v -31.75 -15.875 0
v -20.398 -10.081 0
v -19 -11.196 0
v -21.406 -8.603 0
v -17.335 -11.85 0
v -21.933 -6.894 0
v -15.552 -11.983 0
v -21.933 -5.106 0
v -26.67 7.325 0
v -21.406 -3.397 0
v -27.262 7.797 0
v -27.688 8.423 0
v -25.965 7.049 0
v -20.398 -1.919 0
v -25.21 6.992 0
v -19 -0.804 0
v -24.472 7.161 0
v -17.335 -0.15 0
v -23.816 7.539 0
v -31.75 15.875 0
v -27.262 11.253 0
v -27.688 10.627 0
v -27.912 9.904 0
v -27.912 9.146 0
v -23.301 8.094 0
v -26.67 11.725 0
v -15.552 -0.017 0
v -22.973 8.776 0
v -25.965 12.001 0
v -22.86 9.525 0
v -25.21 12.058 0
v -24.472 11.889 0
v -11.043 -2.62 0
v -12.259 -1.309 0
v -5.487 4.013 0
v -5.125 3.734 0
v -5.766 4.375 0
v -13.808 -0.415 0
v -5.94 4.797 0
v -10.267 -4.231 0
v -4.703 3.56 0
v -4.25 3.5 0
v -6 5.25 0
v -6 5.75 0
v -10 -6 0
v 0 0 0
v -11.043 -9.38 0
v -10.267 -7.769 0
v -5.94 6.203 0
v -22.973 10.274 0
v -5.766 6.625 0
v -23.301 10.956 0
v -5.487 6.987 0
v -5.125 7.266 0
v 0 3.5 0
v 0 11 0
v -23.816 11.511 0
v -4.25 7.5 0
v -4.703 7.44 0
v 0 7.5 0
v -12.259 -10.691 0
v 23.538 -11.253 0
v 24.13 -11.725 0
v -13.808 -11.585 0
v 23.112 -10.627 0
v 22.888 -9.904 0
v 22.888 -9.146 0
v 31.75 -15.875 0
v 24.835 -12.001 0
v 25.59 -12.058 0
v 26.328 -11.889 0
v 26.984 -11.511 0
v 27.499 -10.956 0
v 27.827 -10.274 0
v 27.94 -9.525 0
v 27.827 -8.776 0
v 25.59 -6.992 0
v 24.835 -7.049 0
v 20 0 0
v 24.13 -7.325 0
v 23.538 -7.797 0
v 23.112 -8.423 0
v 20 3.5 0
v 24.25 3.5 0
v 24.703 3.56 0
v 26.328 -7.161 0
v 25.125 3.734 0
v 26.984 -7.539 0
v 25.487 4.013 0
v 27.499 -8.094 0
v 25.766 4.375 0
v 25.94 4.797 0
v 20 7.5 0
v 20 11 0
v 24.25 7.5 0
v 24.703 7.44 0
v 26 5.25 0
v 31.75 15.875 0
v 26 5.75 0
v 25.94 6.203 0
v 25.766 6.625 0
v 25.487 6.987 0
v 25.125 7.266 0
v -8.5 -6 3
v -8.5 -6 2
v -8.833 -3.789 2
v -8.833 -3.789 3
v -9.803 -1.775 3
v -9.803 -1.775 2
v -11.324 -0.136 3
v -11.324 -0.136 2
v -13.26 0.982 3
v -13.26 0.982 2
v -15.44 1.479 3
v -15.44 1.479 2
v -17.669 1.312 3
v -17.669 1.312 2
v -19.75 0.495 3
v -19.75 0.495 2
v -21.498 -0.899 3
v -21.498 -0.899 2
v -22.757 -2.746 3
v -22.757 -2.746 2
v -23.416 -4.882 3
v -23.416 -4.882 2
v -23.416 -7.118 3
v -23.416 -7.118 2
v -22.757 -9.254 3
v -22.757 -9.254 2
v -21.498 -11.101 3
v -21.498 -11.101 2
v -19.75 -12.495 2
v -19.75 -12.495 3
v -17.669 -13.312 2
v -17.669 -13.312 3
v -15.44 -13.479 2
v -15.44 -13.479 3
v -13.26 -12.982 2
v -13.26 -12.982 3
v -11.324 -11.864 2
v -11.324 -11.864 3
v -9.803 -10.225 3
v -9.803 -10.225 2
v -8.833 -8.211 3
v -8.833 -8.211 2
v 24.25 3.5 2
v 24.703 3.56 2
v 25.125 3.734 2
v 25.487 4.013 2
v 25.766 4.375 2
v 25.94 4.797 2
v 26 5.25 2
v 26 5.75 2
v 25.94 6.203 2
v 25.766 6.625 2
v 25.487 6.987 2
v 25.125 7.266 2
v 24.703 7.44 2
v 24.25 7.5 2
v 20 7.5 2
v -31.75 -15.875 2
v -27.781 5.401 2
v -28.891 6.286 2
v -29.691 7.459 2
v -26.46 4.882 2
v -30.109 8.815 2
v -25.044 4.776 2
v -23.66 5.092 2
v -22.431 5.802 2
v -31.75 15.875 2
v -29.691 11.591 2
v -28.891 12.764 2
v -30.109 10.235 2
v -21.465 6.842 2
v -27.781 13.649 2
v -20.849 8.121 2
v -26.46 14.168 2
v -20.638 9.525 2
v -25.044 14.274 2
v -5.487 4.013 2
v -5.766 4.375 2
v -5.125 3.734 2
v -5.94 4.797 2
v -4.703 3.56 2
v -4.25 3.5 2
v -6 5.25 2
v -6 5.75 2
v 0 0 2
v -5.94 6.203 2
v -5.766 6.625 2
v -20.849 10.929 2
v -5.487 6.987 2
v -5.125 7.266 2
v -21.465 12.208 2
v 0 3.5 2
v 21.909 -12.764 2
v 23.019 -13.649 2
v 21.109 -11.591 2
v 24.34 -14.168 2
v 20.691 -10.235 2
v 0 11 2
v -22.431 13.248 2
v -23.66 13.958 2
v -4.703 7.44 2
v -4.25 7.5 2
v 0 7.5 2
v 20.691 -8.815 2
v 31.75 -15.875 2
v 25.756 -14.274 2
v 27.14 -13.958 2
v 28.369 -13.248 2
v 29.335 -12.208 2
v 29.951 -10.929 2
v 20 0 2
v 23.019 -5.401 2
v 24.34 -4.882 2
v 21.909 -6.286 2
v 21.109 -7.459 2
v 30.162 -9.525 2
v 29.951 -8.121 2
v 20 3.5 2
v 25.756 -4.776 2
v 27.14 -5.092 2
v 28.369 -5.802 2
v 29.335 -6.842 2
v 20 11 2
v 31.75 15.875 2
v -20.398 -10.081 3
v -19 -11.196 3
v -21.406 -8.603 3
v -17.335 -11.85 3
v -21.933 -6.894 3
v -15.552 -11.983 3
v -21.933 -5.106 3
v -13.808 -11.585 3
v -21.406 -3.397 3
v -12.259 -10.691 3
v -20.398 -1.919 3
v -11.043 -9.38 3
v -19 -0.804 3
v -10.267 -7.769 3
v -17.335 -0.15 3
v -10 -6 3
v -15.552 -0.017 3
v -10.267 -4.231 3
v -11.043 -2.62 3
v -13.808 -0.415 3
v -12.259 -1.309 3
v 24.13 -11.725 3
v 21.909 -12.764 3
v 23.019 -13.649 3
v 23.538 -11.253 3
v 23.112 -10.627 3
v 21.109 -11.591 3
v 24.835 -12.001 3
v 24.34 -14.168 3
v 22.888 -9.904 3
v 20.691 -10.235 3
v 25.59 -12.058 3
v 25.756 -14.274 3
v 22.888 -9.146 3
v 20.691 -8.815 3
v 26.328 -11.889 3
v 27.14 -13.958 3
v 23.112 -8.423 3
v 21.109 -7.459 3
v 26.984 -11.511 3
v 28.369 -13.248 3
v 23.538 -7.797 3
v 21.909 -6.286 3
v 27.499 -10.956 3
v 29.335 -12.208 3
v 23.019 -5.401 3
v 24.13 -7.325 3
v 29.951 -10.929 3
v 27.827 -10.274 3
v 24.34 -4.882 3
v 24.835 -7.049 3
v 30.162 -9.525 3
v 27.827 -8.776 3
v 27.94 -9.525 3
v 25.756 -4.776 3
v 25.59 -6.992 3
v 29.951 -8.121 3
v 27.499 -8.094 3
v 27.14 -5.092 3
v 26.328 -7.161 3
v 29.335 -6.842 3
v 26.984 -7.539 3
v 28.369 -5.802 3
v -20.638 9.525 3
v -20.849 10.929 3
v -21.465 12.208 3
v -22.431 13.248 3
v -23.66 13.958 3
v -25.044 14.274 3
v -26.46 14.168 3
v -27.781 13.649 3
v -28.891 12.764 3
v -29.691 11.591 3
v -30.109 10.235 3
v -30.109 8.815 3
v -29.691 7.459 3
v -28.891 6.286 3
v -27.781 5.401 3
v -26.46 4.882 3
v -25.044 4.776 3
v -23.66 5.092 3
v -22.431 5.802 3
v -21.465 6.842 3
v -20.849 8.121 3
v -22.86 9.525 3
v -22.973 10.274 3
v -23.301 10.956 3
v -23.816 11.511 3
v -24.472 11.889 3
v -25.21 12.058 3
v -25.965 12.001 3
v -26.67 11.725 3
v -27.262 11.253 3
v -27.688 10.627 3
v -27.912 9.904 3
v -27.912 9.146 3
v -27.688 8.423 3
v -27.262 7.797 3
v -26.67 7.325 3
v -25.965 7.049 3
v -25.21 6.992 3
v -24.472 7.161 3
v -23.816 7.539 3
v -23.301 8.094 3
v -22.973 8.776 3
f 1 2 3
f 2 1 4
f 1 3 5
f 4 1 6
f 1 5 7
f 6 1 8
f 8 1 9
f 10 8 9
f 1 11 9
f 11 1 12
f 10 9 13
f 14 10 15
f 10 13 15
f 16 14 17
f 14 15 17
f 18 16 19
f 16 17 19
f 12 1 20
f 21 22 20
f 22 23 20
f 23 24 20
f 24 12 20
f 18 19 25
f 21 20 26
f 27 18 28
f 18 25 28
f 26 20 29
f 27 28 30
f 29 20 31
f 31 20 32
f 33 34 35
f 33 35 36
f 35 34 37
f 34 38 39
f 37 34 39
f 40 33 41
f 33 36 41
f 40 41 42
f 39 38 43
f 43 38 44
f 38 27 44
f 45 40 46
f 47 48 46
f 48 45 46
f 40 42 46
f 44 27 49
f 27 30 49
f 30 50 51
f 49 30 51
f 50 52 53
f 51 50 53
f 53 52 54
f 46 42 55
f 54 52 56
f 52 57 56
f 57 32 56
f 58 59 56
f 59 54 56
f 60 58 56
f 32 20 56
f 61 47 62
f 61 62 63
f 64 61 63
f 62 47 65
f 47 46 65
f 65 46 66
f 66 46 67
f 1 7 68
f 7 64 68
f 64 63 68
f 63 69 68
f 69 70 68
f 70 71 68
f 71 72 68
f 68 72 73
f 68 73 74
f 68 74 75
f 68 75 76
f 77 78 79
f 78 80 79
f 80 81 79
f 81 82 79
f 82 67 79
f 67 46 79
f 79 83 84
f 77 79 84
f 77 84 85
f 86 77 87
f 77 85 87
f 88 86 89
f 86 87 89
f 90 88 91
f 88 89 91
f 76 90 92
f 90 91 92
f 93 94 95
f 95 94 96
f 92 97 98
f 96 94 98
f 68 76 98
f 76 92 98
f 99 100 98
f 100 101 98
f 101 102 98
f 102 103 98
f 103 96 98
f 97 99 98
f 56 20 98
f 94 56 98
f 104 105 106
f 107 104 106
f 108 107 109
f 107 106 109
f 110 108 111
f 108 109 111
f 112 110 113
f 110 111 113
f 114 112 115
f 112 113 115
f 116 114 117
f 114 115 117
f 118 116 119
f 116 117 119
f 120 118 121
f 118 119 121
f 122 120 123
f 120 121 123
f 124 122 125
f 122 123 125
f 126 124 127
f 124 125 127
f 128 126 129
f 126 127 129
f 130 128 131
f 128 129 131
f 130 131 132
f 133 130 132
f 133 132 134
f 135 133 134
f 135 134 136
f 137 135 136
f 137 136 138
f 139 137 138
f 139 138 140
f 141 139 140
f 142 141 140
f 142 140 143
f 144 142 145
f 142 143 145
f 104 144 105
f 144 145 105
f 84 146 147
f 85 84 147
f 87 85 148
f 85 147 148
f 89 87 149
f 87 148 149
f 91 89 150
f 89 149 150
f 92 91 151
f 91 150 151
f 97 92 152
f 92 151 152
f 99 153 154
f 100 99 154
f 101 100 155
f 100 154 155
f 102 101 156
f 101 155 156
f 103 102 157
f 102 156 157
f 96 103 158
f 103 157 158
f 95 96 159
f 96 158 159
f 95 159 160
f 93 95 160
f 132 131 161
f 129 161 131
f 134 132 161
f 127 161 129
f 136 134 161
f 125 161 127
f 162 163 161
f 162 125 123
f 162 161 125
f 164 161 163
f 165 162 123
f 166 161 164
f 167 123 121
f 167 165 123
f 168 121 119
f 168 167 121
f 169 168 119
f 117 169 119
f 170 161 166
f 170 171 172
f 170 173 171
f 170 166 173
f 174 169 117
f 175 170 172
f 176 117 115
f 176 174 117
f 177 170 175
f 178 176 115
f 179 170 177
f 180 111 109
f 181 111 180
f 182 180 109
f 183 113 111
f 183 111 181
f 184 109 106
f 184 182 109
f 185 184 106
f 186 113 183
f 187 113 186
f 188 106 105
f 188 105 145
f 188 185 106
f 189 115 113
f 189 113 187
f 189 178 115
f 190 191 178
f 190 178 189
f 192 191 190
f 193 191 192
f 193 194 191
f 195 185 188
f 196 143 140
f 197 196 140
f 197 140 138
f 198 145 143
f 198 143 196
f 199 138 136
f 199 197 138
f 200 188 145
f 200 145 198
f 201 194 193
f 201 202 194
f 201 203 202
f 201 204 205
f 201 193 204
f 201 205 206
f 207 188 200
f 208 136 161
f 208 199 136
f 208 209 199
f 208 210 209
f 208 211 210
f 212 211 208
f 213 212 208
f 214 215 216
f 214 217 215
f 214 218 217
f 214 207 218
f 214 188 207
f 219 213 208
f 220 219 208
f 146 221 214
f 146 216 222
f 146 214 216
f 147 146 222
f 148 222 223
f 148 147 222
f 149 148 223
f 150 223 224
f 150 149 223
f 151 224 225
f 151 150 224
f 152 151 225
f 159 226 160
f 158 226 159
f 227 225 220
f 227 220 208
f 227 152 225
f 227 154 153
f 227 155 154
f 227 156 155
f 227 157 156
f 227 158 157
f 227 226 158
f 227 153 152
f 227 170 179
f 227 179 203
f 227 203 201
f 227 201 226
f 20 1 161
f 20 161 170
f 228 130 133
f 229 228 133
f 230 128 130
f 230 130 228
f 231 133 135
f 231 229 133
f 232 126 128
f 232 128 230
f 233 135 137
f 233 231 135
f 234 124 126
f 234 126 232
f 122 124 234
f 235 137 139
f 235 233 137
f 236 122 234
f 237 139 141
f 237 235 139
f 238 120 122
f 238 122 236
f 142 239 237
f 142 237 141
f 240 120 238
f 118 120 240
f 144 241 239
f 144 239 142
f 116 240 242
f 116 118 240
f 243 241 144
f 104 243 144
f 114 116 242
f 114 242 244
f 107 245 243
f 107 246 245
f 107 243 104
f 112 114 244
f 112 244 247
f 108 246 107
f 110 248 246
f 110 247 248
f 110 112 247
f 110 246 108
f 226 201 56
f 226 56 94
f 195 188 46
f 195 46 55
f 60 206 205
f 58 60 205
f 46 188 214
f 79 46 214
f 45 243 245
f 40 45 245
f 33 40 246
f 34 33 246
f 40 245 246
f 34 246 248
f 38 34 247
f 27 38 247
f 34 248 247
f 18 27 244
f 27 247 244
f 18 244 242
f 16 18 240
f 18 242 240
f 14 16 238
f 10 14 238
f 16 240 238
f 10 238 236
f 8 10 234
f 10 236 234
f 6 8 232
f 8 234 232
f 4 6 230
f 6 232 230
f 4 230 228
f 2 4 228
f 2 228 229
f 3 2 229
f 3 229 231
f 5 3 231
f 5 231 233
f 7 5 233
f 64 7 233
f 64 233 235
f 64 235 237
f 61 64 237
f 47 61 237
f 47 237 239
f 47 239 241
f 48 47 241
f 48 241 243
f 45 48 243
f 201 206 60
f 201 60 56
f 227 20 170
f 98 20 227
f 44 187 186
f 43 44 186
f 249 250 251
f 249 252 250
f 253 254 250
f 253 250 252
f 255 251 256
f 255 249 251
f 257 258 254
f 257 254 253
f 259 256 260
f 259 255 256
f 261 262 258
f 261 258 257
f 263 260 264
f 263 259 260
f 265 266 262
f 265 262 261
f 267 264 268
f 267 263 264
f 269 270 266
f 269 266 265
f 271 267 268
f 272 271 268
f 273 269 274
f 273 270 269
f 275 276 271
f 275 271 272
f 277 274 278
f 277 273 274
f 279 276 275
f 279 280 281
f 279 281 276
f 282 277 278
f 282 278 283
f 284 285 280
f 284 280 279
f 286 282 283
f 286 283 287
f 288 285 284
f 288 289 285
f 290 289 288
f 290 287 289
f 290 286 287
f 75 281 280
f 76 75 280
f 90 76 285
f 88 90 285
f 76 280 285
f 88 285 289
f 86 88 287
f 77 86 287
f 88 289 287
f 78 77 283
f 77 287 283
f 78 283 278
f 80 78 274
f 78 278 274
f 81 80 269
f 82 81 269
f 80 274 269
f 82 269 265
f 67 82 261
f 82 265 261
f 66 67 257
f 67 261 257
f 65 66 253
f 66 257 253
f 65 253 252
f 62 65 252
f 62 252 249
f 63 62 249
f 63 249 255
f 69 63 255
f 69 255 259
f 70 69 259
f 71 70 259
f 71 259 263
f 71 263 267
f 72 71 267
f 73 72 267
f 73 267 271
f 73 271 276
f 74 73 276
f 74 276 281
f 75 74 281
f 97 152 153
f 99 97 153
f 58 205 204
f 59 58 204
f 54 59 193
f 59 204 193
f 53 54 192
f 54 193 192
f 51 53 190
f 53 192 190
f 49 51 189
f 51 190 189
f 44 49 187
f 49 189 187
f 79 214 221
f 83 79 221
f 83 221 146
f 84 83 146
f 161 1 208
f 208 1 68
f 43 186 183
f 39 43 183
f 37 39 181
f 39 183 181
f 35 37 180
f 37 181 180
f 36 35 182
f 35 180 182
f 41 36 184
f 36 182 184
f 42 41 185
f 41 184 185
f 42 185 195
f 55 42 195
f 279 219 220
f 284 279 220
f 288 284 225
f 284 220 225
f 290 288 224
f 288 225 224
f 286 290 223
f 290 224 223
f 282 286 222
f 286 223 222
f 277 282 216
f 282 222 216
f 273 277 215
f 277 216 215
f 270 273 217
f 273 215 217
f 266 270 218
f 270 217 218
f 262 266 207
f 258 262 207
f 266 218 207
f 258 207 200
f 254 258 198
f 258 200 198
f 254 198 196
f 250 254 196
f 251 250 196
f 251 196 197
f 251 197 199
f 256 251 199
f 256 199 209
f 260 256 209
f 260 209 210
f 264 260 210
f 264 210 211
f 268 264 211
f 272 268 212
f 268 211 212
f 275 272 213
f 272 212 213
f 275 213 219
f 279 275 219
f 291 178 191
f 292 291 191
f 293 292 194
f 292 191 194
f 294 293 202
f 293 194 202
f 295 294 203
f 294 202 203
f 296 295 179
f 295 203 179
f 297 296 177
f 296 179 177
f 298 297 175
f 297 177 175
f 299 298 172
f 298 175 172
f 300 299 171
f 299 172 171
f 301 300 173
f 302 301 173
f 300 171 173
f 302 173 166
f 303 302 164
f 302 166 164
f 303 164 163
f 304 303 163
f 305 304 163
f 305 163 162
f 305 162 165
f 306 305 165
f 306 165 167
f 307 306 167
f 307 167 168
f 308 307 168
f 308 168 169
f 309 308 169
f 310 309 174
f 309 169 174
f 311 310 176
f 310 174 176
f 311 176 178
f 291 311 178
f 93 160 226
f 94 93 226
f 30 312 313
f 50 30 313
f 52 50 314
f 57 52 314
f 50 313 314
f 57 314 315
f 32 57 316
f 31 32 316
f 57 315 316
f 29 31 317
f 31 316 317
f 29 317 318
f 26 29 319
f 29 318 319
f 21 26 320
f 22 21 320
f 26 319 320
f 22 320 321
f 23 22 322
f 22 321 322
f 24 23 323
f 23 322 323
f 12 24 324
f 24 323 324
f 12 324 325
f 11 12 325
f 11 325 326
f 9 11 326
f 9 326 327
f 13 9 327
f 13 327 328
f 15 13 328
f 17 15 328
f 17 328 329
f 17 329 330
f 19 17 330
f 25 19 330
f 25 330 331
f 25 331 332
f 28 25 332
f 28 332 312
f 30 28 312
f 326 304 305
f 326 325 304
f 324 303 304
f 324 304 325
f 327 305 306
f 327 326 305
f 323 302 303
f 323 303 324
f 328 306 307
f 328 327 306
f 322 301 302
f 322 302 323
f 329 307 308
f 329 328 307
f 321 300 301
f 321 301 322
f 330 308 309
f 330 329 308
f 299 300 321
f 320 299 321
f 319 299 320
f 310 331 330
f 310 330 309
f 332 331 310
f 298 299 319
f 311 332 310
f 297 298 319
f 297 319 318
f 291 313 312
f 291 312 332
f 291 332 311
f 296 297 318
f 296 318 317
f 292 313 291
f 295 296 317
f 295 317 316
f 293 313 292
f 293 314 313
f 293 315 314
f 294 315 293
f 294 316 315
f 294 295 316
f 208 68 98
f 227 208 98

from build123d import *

# Parameters (mm, degrees)
F0_W      = 63.5
F0_H      = 31.75
F1_DEPTH  = 2
F3_R      = 4.7625
F4_DEPTH  = 1
F6_R      = 2.54
F7_DEPTH  = 25.4
F8_W      = 20
F8_H      = 11
F9_DEPTH  = 25
F11_R     = 7.5
F12_DEPTH = 1
F13_R     = 6
F14_DEPTH = 25
F5_R      = 4.7625
F15_DEPTH = 1
F16_R     = 2.54
F17_DEPTH = 25.4
F19_DEPTH = 25


with BuildPart() as f1:
    # F0 (on Top) → F1 (new body)
    with BuildSketch(Plane.XY):
        Rectangle(F0_W, F0_H)
    extrude(amount=F1_DEPTH)

    # F3 (on face) → F4 (join)
    with BuildSketch(Plane.XY.offset(2)):
        with Locations((-25.4, 9.525)):
            Circle(F3_R)
    extrude(amount=F4_DEPTH)

    # F6 (on face) → F7 (cut)
    with BuildSketch(Plane.XY.offset(3)):
        with Locations((-25.4, 9.525)):
            Circle(F6_R)
    extrude(amount=-F7_DEPTH, mode=Mode.SUBTRACT)

    # F8 (on face) → F9 (cut)
    with BuildSketch(Plane.XY.offset(2)):
        with Locations((10, 5.5)):
            Rectangle(F8_W, F8_H)
    extrude(amount=-F9_DEPTH, mode=Mode.SUBTRACT)

    # F11 (on face) → F12 (join)
    with BuildSketch(Plane.XY.offset(2)):
        with Locations((-16, -6)):
            Circle(F11_R)
    extrude(amount=F12_DEPTH)

    # F13 (on face) → F14 (cut)
    with BuildSketch(Plane.XY.offset(3)):
        with Locations((-16, -6)):
            Circle(F13_R)
    extrude(amount=-F14_DEPTH, mode=Mode.SUBTRACT)

    # F5 (on face) → F15 (join)
    with BuildSketch(Plane.XY.offset(2)):
        with Locations((25.4, -9.525)):
            Circle(F5_R)
    extrude(amount=F15_DEPTH)

    # F16 (on face) → F17 (cut)
    with BuildSketch(Plane.XY.offset(3)):
        with Locations((25.4, -9.525)):
            Circle(F16_R)
    extrude(amount=-F17_DEPTH, mode=Mode.SUBTRACT)

    # F18 (on face) → F19 (cut)
    with BuildSketch(Plane.XY.offset(2)):
        with BuildLine():
            Line((6, 3.5), (6, 7.5))
            Line((6, 7.5), (-4.25, 7.5))
            ThreePointArc((-4.25, 7.5), (-5.487437, 6.987437), (-6, 5.75))
            Line((-6, 5.75), (-6, 5.25))
            ThreePointArc((-6, 5.25), (-5.487437, 4.012563), (-4.25, 3.5))
            Line((-4.25, 3.5), (6, 3.5))
        make_face()
        with BuildLine():
            Line((14, 3.5), (24.25, 3.5))
            ThreePointArc((24.25, 3.5), (25.487437, 4.012563), (26, 5.25))
            Line((26, 5.25), (26, 5.75))
            ThreePointArc((26, 5.75), (25.487437, 6.987437), (24.25, 7.5))
            Line((24.25, 7.5), (14, 7.5))
            Line((14, 7.5), (14, 3.5))
        make_face()
    extrude(amount=-F19_DEPTH, mode=Mode.SUBTRACT)


solid = f1.part
